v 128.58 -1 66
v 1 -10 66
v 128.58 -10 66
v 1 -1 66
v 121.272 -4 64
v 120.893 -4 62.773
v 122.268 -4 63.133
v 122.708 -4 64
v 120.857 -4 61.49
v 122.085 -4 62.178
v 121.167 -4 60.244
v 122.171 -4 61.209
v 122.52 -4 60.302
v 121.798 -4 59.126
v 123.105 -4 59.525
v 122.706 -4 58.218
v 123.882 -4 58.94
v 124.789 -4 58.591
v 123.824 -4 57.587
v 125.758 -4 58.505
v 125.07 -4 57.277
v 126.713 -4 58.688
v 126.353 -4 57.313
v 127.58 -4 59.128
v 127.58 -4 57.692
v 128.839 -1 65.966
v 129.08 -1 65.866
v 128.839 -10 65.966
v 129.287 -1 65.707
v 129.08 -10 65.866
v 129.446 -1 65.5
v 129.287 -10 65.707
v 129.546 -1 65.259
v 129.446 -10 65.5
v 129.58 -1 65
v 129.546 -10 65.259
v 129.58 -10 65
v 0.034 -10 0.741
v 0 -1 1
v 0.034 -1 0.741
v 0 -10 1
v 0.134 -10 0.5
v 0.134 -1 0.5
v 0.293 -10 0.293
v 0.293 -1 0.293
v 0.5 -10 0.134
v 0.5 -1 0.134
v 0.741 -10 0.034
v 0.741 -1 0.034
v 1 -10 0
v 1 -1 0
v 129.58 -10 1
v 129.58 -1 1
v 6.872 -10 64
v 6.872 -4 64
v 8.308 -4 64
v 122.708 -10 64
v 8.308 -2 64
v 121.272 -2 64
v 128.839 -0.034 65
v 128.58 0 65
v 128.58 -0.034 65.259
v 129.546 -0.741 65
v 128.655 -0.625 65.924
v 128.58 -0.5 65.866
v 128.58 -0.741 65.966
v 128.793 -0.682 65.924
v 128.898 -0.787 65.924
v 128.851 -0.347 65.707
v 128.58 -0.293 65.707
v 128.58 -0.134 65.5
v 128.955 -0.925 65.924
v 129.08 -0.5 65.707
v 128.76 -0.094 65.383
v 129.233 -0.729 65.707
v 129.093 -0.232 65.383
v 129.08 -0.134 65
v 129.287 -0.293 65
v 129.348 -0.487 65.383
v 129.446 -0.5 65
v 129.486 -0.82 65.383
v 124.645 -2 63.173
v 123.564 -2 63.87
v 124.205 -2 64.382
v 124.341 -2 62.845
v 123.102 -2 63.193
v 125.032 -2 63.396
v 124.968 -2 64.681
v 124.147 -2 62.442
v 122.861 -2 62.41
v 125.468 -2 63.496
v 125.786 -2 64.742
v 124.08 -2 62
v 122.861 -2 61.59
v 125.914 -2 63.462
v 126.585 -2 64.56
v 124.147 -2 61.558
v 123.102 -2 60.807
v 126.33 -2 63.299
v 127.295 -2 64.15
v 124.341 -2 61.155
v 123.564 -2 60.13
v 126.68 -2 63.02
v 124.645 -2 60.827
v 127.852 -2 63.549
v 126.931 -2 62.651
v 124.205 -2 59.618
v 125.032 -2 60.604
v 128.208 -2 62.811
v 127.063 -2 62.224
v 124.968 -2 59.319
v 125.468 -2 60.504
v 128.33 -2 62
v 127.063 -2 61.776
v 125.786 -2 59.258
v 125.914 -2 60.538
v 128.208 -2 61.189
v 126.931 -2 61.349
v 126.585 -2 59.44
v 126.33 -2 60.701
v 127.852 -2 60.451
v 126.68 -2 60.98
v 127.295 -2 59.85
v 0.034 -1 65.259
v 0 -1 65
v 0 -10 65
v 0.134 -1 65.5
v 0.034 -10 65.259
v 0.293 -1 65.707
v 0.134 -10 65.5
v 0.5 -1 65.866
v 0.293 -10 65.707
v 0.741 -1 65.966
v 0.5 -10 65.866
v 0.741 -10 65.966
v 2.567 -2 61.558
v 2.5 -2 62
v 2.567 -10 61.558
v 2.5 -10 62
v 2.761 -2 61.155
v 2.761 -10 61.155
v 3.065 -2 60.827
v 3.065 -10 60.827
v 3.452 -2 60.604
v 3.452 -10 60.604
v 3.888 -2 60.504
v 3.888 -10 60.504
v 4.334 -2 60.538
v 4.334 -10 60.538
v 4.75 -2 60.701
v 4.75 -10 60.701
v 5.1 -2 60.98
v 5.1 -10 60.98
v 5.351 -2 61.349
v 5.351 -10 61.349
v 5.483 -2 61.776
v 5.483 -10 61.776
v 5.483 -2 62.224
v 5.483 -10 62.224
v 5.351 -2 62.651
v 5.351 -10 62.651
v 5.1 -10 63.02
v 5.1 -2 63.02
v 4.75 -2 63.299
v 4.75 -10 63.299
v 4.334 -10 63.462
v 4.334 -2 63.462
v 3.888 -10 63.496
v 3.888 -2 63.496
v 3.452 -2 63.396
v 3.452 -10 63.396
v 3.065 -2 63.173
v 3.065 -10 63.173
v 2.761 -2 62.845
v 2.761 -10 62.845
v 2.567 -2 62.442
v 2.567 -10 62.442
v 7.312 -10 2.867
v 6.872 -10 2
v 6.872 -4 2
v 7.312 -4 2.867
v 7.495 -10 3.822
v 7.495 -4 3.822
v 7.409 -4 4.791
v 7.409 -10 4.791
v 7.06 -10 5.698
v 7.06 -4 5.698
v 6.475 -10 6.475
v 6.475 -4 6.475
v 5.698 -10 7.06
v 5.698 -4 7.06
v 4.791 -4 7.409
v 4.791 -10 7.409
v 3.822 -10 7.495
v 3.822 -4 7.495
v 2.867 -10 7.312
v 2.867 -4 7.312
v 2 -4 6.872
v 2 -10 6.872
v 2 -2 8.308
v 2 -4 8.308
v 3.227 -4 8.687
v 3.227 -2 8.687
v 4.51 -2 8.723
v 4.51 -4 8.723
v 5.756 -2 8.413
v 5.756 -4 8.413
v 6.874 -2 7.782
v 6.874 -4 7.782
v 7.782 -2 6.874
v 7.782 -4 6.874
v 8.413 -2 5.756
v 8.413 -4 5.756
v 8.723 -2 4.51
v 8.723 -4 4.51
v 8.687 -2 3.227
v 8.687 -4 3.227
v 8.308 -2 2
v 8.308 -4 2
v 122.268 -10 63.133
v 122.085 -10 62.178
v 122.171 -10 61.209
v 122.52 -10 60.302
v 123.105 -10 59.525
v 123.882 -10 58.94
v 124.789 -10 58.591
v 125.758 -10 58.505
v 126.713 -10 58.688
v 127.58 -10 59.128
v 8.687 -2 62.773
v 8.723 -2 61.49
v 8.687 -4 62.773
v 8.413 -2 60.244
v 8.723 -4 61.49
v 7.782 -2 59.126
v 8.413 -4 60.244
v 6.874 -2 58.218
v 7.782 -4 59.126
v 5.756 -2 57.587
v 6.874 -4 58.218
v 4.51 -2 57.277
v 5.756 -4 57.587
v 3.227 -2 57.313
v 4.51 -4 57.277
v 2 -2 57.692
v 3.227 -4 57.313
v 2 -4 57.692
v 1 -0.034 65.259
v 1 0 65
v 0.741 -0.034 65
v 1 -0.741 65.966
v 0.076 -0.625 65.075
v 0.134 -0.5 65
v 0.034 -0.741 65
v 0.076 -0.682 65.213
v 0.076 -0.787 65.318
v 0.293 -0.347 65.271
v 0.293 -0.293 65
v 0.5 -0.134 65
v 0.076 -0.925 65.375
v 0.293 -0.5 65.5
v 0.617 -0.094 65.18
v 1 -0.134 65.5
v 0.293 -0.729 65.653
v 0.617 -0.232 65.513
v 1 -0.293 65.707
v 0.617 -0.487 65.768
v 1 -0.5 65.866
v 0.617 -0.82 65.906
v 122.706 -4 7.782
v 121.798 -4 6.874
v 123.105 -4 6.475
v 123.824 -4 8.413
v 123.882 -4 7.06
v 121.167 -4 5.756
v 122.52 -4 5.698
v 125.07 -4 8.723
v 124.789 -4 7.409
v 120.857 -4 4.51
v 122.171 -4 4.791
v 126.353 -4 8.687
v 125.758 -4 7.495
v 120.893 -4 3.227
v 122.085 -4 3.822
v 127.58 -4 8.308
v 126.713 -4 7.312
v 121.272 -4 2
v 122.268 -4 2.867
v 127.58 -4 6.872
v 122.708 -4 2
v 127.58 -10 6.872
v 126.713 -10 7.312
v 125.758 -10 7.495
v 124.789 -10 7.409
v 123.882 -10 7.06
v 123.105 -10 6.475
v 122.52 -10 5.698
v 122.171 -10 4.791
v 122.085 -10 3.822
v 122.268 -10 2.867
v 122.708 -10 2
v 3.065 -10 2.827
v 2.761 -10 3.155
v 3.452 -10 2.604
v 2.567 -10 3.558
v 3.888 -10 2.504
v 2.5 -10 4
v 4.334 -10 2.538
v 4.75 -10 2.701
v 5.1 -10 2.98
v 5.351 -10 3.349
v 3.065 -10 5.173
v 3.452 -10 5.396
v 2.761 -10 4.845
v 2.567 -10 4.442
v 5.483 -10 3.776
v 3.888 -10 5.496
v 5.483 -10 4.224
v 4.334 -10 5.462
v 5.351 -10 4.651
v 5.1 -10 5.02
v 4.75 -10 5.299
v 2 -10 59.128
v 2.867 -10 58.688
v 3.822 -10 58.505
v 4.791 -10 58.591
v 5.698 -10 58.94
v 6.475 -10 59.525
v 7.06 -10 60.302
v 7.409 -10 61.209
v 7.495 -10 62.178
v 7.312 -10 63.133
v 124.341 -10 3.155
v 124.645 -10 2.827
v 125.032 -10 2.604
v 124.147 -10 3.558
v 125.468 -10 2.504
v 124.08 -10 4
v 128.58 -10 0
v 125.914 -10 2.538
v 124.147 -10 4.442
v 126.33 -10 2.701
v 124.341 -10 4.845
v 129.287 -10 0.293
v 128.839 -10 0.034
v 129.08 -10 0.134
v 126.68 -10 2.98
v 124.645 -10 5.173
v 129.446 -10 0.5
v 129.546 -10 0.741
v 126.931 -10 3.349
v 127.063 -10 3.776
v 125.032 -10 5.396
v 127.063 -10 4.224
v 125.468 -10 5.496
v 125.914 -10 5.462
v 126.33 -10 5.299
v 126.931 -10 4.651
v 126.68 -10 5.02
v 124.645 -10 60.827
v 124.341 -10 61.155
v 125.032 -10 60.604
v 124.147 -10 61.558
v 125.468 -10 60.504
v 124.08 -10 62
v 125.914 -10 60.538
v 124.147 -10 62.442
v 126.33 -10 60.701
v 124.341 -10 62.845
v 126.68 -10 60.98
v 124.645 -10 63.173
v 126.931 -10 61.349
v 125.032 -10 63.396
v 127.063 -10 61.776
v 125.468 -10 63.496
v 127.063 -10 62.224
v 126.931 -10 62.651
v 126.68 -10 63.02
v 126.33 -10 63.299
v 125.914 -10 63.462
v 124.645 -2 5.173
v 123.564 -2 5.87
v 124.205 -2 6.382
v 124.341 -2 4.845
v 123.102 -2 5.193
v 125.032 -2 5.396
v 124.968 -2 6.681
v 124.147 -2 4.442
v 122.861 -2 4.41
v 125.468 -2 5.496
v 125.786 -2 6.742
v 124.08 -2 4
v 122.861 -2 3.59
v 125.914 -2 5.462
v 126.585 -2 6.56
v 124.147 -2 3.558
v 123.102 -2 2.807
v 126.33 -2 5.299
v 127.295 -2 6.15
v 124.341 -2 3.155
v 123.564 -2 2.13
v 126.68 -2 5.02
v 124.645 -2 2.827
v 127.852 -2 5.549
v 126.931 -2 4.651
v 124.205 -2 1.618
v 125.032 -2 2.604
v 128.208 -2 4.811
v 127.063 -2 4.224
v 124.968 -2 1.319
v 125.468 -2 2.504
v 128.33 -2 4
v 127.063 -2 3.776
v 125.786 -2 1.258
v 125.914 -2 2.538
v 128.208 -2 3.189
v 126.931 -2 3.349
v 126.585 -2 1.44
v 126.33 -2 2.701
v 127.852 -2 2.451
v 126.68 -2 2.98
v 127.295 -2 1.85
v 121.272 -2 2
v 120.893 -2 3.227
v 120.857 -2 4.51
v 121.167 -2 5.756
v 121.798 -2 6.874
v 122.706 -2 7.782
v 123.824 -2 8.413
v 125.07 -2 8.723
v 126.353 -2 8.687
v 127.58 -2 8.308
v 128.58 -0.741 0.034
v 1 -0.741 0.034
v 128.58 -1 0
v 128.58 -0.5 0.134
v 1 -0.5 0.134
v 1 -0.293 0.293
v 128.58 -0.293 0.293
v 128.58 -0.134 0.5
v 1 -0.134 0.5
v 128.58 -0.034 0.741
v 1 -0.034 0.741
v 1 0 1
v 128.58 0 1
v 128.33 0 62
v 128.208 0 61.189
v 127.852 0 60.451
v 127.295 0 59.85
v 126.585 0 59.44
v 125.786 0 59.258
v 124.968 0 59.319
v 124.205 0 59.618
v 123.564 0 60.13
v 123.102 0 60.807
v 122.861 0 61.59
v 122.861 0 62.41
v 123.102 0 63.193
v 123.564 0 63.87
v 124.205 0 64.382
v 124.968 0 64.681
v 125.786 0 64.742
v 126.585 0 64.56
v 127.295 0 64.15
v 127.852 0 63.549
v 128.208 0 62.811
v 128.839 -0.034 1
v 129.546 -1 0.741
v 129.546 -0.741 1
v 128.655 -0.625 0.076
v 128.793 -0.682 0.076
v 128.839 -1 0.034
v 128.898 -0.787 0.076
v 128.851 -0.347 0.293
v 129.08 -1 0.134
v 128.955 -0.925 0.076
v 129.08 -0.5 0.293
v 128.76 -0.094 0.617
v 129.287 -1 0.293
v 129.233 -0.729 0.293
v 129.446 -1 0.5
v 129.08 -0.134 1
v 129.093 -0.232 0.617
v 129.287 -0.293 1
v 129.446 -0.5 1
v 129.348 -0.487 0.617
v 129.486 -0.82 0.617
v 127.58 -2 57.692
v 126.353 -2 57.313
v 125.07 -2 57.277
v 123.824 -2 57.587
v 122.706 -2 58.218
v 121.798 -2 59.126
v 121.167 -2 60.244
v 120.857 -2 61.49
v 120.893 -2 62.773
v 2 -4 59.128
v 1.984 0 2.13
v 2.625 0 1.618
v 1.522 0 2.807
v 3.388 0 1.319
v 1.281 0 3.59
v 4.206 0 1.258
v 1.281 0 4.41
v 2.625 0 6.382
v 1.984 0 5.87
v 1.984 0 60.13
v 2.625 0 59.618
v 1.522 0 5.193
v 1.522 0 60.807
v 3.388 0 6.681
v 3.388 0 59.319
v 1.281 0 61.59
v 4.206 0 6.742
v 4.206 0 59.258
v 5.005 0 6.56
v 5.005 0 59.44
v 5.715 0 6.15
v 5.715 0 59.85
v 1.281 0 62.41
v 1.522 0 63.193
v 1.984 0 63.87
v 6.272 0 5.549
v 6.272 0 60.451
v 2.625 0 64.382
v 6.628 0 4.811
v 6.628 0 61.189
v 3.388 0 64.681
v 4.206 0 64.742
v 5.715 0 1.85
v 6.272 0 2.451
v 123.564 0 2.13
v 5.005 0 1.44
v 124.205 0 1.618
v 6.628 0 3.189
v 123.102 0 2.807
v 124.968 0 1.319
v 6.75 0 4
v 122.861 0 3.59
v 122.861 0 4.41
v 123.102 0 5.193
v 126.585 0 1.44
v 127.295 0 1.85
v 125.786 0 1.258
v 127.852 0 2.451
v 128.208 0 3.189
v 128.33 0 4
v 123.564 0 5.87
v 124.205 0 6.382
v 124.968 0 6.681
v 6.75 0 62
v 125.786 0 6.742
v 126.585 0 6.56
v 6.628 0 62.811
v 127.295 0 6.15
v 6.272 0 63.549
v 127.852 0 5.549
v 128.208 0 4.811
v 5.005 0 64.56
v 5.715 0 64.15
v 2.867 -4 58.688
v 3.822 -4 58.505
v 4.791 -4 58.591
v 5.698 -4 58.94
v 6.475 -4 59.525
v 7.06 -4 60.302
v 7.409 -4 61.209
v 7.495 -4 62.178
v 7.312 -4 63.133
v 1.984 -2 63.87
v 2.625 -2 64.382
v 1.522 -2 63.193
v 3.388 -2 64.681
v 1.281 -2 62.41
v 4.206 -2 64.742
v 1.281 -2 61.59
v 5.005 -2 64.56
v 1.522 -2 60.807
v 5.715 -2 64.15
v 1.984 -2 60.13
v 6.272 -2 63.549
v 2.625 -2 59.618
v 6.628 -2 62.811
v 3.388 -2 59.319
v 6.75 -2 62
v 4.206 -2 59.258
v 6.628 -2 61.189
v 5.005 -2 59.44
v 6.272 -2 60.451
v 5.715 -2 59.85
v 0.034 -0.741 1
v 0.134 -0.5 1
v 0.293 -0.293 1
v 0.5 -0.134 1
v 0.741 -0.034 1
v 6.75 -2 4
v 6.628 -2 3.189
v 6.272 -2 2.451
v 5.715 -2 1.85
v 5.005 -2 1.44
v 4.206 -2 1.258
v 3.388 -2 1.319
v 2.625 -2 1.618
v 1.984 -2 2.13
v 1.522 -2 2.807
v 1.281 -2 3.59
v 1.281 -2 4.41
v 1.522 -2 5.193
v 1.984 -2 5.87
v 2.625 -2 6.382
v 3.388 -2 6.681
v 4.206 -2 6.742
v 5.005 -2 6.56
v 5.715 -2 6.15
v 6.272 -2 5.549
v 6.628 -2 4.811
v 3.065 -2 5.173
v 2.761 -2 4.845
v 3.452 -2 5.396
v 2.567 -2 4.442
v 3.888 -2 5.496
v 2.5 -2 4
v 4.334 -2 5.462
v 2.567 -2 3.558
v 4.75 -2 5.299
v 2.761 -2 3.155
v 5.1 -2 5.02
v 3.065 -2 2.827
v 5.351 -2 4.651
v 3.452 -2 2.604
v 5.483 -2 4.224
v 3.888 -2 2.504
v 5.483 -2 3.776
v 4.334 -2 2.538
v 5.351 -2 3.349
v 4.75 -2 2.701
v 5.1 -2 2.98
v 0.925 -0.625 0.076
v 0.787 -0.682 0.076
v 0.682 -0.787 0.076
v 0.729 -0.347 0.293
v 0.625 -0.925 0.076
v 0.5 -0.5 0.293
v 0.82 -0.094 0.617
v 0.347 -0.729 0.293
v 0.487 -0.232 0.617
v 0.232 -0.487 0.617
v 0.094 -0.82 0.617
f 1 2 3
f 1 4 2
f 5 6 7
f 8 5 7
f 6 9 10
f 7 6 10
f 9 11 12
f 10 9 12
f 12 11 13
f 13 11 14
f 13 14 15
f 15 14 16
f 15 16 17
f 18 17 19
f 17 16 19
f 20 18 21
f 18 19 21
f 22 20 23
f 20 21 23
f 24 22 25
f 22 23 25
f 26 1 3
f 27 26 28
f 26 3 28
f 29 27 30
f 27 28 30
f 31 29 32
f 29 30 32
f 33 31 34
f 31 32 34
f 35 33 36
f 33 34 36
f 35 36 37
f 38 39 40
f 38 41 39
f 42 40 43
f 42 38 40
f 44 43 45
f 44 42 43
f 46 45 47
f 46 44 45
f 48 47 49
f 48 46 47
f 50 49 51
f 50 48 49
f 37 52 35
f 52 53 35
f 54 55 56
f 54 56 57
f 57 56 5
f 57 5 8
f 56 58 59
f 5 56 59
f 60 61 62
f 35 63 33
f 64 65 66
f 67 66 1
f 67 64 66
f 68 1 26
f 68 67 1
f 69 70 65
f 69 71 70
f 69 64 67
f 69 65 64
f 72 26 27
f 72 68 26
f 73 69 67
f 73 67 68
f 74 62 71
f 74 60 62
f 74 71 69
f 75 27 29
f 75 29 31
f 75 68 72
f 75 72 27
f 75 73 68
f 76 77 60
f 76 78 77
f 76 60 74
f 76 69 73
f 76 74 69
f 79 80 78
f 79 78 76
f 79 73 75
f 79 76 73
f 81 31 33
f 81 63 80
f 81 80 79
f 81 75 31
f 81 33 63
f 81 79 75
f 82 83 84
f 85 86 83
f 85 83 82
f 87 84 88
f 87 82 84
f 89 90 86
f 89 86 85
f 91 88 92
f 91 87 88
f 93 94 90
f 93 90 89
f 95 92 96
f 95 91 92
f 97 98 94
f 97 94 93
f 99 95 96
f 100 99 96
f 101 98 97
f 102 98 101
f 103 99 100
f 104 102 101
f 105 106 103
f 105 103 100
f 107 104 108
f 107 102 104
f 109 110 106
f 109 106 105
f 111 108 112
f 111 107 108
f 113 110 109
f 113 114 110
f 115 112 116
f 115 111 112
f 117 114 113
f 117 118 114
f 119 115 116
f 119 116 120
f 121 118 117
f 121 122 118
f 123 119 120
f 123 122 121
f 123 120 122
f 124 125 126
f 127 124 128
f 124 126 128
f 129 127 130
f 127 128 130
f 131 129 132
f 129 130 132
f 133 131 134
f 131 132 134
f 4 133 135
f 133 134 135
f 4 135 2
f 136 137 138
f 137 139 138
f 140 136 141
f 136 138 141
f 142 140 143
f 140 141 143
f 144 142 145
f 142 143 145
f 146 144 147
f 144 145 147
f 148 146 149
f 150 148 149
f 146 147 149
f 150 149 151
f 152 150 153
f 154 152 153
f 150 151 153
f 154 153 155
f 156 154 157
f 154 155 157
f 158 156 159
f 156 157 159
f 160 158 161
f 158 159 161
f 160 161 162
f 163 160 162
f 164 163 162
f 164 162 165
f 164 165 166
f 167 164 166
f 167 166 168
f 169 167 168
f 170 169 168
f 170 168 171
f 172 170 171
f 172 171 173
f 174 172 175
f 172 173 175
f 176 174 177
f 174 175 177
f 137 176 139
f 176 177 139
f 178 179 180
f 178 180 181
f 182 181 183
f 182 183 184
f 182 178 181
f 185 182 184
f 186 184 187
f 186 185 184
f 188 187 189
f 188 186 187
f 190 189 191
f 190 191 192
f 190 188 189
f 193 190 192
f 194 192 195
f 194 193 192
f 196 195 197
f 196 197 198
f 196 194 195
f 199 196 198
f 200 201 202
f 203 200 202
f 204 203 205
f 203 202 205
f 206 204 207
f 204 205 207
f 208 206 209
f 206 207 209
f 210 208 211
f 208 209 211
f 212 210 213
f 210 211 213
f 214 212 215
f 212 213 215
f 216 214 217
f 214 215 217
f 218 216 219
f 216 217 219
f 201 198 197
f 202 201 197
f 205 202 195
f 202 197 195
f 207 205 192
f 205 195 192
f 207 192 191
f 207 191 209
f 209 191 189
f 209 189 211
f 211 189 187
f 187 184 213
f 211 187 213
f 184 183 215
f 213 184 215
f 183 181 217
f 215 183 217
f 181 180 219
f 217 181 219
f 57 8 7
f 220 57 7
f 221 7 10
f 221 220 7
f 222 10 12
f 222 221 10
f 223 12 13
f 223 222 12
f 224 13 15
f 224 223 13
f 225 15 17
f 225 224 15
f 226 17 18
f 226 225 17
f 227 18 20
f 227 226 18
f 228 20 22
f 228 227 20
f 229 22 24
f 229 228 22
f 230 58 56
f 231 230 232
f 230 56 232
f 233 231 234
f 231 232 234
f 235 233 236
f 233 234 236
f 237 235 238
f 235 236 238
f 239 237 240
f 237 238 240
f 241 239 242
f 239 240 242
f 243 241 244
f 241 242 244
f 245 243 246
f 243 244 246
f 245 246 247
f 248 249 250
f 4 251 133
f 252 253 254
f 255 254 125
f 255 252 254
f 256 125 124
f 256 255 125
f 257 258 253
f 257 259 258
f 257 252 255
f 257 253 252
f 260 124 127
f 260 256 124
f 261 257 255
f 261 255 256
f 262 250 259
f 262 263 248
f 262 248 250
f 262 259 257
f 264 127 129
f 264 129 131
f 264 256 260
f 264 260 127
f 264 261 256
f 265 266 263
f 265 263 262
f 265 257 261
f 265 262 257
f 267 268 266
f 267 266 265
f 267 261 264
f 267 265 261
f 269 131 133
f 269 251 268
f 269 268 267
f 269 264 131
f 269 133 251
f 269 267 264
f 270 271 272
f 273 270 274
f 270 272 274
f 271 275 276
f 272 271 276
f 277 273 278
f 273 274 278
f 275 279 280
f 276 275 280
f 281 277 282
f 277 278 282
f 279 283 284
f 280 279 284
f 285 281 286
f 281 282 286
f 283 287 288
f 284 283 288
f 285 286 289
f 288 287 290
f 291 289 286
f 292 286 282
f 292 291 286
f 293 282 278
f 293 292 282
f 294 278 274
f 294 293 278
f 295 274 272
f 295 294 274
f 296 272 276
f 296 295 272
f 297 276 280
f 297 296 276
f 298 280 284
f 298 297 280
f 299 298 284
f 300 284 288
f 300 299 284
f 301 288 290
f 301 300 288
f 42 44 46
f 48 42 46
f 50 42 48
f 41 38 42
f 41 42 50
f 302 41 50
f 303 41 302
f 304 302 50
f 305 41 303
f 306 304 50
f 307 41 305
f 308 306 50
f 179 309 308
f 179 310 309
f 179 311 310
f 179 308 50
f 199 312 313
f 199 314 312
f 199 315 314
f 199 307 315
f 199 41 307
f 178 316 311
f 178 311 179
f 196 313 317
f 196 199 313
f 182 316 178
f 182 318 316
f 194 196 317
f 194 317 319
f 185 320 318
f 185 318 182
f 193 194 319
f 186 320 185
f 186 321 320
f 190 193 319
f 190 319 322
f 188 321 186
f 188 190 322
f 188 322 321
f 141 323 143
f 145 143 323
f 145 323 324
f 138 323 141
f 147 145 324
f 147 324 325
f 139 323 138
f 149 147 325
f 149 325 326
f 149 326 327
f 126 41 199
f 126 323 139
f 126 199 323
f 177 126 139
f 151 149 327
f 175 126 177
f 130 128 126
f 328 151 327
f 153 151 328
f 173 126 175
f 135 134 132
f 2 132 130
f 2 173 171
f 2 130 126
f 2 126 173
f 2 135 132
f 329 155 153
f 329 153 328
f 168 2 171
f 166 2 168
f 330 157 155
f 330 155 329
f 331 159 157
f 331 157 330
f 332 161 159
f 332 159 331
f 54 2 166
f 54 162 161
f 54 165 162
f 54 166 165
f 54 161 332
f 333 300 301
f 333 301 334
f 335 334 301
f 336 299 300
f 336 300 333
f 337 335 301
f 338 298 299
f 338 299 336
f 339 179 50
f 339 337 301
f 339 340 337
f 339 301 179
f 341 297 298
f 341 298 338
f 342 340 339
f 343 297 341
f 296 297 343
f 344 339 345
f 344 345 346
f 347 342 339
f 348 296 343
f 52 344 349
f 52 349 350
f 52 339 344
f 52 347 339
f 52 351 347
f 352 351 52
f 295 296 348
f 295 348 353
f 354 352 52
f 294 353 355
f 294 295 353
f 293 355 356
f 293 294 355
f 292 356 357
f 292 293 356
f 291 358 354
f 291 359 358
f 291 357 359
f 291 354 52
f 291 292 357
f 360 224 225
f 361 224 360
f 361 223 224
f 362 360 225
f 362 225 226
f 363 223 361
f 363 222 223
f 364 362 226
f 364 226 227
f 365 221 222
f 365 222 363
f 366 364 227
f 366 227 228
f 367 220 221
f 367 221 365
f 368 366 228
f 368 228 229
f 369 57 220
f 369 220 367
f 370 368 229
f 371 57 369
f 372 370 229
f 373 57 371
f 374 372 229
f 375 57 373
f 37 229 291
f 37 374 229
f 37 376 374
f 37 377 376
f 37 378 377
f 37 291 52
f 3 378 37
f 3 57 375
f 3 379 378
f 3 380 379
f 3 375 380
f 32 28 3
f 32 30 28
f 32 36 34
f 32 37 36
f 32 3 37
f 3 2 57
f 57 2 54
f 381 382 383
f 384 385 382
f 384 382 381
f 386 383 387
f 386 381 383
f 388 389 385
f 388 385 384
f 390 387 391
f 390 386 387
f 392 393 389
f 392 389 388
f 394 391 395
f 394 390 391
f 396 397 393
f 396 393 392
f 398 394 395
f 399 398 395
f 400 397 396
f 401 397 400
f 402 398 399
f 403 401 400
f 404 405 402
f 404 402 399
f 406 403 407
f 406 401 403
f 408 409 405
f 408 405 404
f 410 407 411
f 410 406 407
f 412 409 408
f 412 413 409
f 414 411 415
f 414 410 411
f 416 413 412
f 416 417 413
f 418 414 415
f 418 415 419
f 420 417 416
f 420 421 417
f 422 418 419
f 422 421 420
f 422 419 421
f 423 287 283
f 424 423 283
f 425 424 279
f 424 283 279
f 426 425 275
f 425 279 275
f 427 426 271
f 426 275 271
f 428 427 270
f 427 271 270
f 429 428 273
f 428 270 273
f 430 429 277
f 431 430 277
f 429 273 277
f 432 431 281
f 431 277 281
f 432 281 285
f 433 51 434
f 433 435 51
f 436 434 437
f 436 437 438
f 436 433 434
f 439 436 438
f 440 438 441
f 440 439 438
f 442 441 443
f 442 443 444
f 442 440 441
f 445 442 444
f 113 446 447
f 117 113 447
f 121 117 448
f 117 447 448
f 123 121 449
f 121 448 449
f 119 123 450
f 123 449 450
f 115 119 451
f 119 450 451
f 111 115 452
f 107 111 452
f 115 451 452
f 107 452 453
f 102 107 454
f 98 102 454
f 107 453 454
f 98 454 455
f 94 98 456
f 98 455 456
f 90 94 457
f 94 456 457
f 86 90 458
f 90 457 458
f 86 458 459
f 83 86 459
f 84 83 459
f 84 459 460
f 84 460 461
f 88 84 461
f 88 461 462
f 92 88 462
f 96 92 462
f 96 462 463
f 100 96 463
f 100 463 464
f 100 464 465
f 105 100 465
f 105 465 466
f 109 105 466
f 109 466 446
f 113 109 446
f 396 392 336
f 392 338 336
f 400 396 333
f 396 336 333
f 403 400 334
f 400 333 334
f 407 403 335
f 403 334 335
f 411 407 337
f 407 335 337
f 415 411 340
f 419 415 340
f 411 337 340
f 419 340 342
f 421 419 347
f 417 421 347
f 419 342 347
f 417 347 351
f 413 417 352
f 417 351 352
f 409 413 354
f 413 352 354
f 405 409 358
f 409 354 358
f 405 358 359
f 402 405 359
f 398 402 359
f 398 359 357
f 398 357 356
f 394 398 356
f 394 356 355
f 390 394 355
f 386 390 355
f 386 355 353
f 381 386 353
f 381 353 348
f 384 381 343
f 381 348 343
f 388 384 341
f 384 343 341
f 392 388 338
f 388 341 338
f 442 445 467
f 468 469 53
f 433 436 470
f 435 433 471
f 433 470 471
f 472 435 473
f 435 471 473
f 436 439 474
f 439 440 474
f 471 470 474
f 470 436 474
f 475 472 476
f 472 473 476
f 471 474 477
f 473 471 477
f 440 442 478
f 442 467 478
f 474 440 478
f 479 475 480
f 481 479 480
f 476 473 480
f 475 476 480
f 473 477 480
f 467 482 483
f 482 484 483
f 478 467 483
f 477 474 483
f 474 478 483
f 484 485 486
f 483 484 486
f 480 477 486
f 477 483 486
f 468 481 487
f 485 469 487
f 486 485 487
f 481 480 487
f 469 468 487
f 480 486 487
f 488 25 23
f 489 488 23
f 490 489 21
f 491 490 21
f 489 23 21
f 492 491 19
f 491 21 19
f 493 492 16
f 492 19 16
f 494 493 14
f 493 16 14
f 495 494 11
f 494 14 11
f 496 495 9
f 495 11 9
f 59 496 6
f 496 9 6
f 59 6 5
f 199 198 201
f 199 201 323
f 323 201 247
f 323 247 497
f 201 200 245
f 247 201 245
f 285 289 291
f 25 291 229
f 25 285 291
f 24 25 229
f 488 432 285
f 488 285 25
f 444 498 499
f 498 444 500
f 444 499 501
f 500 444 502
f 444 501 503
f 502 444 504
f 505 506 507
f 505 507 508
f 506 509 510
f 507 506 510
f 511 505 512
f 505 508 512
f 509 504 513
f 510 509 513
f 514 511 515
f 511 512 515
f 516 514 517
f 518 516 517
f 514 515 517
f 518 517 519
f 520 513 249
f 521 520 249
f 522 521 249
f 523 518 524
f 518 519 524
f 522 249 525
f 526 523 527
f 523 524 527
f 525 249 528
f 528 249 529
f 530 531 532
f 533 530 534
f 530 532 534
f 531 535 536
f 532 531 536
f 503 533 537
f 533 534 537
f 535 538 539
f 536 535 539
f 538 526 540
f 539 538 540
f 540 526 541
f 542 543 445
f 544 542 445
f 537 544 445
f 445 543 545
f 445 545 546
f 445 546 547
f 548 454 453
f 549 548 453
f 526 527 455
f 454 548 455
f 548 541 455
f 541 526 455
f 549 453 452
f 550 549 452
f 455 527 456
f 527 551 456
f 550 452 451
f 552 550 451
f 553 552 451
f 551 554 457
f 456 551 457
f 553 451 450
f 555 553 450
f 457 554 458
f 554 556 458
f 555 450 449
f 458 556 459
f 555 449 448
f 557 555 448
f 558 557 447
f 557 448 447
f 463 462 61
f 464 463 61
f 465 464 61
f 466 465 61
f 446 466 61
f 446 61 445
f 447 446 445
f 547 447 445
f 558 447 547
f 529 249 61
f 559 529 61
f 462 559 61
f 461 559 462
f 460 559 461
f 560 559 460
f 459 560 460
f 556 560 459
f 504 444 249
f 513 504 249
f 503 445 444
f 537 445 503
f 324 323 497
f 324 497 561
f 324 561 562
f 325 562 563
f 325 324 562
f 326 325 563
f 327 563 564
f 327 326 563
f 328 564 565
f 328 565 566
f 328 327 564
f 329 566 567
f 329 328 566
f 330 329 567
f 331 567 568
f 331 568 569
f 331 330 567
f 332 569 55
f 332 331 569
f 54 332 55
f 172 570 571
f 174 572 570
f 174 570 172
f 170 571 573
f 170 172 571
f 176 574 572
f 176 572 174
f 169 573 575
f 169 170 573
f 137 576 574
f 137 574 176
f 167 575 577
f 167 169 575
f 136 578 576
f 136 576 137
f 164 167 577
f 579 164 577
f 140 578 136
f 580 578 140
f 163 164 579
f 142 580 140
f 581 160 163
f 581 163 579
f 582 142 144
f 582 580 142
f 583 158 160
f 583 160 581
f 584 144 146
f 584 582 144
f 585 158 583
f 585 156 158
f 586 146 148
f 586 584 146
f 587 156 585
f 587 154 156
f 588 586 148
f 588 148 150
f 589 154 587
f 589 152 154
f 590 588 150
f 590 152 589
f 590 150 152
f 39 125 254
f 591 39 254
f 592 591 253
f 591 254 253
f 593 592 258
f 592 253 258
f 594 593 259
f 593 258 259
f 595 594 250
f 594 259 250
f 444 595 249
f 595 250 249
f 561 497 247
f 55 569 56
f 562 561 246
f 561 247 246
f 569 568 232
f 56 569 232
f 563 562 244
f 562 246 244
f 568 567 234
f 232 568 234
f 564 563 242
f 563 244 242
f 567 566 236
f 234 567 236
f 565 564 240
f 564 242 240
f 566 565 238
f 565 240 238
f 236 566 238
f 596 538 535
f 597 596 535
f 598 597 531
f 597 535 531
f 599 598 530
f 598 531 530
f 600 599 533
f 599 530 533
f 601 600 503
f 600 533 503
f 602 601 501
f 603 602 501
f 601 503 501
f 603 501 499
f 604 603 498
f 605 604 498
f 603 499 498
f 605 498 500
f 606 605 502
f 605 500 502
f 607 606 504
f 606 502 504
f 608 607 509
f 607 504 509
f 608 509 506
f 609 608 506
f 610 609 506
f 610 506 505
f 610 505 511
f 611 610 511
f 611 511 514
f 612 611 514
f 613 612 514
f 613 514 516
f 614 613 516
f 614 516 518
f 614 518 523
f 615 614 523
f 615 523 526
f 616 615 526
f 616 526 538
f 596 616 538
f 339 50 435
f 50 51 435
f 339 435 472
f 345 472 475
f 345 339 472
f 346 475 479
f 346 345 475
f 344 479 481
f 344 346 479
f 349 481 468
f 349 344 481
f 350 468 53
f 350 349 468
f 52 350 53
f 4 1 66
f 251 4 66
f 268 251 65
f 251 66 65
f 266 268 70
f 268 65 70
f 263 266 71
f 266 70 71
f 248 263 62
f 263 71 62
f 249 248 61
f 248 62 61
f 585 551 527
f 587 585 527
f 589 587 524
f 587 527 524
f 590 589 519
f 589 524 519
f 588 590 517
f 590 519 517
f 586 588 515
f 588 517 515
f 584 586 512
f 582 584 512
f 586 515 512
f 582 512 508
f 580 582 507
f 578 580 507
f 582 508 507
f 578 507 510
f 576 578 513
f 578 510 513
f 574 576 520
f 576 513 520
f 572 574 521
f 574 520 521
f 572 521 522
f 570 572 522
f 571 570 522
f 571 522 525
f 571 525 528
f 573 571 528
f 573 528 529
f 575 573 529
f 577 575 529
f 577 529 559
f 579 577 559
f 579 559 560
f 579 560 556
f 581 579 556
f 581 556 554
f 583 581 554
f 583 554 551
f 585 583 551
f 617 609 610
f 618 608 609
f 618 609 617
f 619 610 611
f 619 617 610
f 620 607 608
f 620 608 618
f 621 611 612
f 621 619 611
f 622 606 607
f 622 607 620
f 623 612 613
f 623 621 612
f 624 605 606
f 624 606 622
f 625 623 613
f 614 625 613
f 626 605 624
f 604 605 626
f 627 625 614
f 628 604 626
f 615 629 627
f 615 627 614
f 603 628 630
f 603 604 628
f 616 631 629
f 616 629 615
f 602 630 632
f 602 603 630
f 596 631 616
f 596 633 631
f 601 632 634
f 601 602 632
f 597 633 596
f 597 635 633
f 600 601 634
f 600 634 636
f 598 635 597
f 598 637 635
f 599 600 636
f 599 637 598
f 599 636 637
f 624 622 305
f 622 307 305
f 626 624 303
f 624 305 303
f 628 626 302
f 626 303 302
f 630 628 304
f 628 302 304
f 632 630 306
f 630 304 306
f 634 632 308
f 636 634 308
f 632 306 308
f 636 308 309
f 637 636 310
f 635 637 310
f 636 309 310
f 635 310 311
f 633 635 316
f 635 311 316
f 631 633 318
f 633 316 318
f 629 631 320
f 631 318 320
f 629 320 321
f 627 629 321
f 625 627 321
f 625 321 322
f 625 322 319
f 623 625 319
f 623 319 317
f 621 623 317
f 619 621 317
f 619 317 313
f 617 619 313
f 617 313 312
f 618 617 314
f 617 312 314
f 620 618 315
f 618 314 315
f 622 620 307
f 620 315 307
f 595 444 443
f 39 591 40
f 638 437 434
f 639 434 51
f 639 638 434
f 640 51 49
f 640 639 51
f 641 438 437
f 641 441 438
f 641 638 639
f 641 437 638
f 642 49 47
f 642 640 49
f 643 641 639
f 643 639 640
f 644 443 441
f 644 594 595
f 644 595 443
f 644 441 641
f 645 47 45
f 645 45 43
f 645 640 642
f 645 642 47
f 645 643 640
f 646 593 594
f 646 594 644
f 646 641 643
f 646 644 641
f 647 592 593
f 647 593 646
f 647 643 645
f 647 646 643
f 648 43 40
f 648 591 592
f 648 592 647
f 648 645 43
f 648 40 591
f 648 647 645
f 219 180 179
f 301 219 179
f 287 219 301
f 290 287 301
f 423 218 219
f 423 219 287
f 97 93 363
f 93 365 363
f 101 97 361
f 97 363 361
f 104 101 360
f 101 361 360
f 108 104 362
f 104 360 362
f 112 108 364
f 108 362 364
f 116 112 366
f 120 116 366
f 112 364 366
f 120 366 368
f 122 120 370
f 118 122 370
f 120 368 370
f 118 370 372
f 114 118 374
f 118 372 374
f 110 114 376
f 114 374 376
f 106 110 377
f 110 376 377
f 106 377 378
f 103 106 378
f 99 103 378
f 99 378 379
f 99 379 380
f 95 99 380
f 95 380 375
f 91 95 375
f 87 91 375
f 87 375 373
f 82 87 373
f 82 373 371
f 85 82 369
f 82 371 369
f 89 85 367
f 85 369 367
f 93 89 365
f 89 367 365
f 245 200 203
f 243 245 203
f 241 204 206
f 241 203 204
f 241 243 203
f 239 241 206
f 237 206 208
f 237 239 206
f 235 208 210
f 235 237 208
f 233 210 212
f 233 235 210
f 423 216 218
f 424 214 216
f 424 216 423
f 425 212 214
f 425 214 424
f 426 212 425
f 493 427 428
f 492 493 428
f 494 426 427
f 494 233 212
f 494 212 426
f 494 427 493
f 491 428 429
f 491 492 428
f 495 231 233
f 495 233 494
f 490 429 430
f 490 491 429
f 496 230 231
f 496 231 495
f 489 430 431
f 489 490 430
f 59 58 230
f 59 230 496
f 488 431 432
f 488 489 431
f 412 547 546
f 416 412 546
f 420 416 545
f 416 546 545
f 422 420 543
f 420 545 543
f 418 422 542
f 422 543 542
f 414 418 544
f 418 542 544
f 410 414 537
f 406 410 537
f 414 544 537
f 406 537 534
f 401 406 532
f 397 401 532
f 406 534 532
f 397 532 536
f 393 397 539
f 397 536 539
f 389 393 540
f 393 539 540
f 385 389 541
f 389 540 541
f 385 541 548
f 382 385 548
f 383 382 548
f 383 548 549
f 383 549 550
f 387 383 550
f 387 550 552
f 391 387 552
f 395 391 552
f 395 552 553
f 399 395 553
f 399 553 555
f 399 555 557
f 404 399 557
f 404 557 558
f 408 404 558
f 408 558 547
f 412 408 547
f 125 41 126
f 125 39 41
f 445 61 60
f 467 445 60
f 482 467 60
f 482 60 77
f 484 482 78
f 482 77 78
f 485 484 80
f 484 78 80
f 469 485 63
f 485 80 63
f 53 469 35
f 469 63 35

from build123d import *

# Parameters (mm, degrees)
F0_W           = 129.58
F0_H           = 66
F1_DEPTH       = 10
F3_D           = 3
F3_DEPTH       = 11
F3_CBORE_D     = 5.5
F3_CBORE_DEPTH = 2
F3_TIP         = 0.9012909285
F4_T           = 2
F5_R           = 1


# Not quite as in the source:
# - a shell that OpenCascade refuses in one call is made with other operations: the cavity is built on its own and cut out


with BuildPart() as f1:
    # F0 (on Front) → F1 (new body)
    with BuildSketch(Plane.XZ):
        with Locations((64.79, 33)):
            Rectangle(F0_W, F0_H)
    extrude(amount=F1_DEPTH)

    # F3
    with Locations(Plane(origin=(0, 0, 0), x_dir=(1, 0, 0), z_dir=(0, 1, 0))):
        with Locations((4, -62), (4, -4), (125.58, -4), (125.58, -62)):
            CounterBoreHole(F3_D / 2, F3_CBORE_D / 2, F3_CBORE_DEPTH, depth=F3_DEPTH)
            with Locations((0, 0, -(F3_DEPTH + F3_TIP / 2))):  # 118° drill point
                Cone(0, F3_D / 2, F3_TIP, mode=Mode.SUBTRACT)

    # F4: shell of thickness 2, made by hand


with BuildPart() as f4_core1:
    # F4_t2: copy of F1
    add(f1.part)

    # the walls: a layer under each face that stays
    f4_faces = [f4_core1.faces().sort_by_distance(p)[0] for p in [
        (0, -5, 33),
        (64.79, -5, 66),
        (64.79, -5, 0),
        (64.79, 0, 33),
        (129.58, -5, 33),
        (1.25, -1, 4),
        (122.83, -1, 4),
        (1.25, -1, 62),
        (122.83, -1, 62),
        (2.5, -6, 4),
        (124.08, -6, 4),
        (2.5, -6, 62),
        (124.08, -6, 62),
        (2.1666666667, -2, 5.8333333333),
        (123.7466666667, -2, 5.8333333333),
        (2.1666666667, -2, 63.8333333333),
        (123.7466666667, -2, 63.8333333333),
    ]]
    thicken(f4_faces, amount=-F4_T, mode=Mode.SUBTRACT)

    # F4_s3 → F4_t4 (revolve, cut)
    with BuildSketch(Plane.XY.offset(4)):
        Polygon((6.73, -1.98), (8.75, -2), (8.75, -4), (6.75, -4), align=None)
    revolve(axis=Axis((4, -2, 4), (0, 1, 0)), mode=Mode.SUBTRACT)

    # F4_s5 → F4_t6 (revolve, cut)
    with BuildSketch(Plane.XY.offset(4)):
        Polygon((128.31, -1.98), (130.33, -2), (130.33, -4), (128.33, -4), align=None)
    revolve(axis=Axis((125.58, -2, 4), (0, 1, 0)), mode=Mode.SUBTRACT)

    # F4_s7 → F4_t8 (revolve, cut)
    with BuildSketch(Plane.XY.offset(62)):
        Polygon((6.73, -1.98), (8.75, -2), (8.75, -4), (6.75, -4), align=None)
    revolve(axis=Axis((4, -2, 62), (0, 1, 0)), mode=Mode.SUBTRACT)

    # F4_s9 → F4_t10 (revolve, cut)
    with BuildSketch(Plane.XY.offset(62)):
        Polygon((128.31, -1.98), (130.33, -2), (130.33, -4), (128.33, -4), align=None)
    revolve(axis=Axis((125.58, -2, 62), (0, 1, 0)), mode=Mode.SUBTRACT)


with BuildPart() as f1_1:
    add(f1.part)

    # what is left inside the walls is the cavity
    f4_cavity = [f4_core1.part.solids().sort_by_distance(p)[0] for p in [
        (64.79, -9.98, 22.666667),
    ]]
    add(f4_cavity, mode=Mode.SUBTRACT)

    # F5
    f5_edges = [f1_1.edges().sort_by_distance(p)[0] for p in [
        (129.58, 0, 33),
        (64.79, 0, 66),
        (0, 0, 33),
        (64.79, 0, 0),
        (129.58, -5, 66),
        (129.58, -5, 0),
        (0, -5, 0),
        (0, -5, 66),
    ]]
    fillet(f5_edges, radius=F5_R)


solid = f1_1.part
